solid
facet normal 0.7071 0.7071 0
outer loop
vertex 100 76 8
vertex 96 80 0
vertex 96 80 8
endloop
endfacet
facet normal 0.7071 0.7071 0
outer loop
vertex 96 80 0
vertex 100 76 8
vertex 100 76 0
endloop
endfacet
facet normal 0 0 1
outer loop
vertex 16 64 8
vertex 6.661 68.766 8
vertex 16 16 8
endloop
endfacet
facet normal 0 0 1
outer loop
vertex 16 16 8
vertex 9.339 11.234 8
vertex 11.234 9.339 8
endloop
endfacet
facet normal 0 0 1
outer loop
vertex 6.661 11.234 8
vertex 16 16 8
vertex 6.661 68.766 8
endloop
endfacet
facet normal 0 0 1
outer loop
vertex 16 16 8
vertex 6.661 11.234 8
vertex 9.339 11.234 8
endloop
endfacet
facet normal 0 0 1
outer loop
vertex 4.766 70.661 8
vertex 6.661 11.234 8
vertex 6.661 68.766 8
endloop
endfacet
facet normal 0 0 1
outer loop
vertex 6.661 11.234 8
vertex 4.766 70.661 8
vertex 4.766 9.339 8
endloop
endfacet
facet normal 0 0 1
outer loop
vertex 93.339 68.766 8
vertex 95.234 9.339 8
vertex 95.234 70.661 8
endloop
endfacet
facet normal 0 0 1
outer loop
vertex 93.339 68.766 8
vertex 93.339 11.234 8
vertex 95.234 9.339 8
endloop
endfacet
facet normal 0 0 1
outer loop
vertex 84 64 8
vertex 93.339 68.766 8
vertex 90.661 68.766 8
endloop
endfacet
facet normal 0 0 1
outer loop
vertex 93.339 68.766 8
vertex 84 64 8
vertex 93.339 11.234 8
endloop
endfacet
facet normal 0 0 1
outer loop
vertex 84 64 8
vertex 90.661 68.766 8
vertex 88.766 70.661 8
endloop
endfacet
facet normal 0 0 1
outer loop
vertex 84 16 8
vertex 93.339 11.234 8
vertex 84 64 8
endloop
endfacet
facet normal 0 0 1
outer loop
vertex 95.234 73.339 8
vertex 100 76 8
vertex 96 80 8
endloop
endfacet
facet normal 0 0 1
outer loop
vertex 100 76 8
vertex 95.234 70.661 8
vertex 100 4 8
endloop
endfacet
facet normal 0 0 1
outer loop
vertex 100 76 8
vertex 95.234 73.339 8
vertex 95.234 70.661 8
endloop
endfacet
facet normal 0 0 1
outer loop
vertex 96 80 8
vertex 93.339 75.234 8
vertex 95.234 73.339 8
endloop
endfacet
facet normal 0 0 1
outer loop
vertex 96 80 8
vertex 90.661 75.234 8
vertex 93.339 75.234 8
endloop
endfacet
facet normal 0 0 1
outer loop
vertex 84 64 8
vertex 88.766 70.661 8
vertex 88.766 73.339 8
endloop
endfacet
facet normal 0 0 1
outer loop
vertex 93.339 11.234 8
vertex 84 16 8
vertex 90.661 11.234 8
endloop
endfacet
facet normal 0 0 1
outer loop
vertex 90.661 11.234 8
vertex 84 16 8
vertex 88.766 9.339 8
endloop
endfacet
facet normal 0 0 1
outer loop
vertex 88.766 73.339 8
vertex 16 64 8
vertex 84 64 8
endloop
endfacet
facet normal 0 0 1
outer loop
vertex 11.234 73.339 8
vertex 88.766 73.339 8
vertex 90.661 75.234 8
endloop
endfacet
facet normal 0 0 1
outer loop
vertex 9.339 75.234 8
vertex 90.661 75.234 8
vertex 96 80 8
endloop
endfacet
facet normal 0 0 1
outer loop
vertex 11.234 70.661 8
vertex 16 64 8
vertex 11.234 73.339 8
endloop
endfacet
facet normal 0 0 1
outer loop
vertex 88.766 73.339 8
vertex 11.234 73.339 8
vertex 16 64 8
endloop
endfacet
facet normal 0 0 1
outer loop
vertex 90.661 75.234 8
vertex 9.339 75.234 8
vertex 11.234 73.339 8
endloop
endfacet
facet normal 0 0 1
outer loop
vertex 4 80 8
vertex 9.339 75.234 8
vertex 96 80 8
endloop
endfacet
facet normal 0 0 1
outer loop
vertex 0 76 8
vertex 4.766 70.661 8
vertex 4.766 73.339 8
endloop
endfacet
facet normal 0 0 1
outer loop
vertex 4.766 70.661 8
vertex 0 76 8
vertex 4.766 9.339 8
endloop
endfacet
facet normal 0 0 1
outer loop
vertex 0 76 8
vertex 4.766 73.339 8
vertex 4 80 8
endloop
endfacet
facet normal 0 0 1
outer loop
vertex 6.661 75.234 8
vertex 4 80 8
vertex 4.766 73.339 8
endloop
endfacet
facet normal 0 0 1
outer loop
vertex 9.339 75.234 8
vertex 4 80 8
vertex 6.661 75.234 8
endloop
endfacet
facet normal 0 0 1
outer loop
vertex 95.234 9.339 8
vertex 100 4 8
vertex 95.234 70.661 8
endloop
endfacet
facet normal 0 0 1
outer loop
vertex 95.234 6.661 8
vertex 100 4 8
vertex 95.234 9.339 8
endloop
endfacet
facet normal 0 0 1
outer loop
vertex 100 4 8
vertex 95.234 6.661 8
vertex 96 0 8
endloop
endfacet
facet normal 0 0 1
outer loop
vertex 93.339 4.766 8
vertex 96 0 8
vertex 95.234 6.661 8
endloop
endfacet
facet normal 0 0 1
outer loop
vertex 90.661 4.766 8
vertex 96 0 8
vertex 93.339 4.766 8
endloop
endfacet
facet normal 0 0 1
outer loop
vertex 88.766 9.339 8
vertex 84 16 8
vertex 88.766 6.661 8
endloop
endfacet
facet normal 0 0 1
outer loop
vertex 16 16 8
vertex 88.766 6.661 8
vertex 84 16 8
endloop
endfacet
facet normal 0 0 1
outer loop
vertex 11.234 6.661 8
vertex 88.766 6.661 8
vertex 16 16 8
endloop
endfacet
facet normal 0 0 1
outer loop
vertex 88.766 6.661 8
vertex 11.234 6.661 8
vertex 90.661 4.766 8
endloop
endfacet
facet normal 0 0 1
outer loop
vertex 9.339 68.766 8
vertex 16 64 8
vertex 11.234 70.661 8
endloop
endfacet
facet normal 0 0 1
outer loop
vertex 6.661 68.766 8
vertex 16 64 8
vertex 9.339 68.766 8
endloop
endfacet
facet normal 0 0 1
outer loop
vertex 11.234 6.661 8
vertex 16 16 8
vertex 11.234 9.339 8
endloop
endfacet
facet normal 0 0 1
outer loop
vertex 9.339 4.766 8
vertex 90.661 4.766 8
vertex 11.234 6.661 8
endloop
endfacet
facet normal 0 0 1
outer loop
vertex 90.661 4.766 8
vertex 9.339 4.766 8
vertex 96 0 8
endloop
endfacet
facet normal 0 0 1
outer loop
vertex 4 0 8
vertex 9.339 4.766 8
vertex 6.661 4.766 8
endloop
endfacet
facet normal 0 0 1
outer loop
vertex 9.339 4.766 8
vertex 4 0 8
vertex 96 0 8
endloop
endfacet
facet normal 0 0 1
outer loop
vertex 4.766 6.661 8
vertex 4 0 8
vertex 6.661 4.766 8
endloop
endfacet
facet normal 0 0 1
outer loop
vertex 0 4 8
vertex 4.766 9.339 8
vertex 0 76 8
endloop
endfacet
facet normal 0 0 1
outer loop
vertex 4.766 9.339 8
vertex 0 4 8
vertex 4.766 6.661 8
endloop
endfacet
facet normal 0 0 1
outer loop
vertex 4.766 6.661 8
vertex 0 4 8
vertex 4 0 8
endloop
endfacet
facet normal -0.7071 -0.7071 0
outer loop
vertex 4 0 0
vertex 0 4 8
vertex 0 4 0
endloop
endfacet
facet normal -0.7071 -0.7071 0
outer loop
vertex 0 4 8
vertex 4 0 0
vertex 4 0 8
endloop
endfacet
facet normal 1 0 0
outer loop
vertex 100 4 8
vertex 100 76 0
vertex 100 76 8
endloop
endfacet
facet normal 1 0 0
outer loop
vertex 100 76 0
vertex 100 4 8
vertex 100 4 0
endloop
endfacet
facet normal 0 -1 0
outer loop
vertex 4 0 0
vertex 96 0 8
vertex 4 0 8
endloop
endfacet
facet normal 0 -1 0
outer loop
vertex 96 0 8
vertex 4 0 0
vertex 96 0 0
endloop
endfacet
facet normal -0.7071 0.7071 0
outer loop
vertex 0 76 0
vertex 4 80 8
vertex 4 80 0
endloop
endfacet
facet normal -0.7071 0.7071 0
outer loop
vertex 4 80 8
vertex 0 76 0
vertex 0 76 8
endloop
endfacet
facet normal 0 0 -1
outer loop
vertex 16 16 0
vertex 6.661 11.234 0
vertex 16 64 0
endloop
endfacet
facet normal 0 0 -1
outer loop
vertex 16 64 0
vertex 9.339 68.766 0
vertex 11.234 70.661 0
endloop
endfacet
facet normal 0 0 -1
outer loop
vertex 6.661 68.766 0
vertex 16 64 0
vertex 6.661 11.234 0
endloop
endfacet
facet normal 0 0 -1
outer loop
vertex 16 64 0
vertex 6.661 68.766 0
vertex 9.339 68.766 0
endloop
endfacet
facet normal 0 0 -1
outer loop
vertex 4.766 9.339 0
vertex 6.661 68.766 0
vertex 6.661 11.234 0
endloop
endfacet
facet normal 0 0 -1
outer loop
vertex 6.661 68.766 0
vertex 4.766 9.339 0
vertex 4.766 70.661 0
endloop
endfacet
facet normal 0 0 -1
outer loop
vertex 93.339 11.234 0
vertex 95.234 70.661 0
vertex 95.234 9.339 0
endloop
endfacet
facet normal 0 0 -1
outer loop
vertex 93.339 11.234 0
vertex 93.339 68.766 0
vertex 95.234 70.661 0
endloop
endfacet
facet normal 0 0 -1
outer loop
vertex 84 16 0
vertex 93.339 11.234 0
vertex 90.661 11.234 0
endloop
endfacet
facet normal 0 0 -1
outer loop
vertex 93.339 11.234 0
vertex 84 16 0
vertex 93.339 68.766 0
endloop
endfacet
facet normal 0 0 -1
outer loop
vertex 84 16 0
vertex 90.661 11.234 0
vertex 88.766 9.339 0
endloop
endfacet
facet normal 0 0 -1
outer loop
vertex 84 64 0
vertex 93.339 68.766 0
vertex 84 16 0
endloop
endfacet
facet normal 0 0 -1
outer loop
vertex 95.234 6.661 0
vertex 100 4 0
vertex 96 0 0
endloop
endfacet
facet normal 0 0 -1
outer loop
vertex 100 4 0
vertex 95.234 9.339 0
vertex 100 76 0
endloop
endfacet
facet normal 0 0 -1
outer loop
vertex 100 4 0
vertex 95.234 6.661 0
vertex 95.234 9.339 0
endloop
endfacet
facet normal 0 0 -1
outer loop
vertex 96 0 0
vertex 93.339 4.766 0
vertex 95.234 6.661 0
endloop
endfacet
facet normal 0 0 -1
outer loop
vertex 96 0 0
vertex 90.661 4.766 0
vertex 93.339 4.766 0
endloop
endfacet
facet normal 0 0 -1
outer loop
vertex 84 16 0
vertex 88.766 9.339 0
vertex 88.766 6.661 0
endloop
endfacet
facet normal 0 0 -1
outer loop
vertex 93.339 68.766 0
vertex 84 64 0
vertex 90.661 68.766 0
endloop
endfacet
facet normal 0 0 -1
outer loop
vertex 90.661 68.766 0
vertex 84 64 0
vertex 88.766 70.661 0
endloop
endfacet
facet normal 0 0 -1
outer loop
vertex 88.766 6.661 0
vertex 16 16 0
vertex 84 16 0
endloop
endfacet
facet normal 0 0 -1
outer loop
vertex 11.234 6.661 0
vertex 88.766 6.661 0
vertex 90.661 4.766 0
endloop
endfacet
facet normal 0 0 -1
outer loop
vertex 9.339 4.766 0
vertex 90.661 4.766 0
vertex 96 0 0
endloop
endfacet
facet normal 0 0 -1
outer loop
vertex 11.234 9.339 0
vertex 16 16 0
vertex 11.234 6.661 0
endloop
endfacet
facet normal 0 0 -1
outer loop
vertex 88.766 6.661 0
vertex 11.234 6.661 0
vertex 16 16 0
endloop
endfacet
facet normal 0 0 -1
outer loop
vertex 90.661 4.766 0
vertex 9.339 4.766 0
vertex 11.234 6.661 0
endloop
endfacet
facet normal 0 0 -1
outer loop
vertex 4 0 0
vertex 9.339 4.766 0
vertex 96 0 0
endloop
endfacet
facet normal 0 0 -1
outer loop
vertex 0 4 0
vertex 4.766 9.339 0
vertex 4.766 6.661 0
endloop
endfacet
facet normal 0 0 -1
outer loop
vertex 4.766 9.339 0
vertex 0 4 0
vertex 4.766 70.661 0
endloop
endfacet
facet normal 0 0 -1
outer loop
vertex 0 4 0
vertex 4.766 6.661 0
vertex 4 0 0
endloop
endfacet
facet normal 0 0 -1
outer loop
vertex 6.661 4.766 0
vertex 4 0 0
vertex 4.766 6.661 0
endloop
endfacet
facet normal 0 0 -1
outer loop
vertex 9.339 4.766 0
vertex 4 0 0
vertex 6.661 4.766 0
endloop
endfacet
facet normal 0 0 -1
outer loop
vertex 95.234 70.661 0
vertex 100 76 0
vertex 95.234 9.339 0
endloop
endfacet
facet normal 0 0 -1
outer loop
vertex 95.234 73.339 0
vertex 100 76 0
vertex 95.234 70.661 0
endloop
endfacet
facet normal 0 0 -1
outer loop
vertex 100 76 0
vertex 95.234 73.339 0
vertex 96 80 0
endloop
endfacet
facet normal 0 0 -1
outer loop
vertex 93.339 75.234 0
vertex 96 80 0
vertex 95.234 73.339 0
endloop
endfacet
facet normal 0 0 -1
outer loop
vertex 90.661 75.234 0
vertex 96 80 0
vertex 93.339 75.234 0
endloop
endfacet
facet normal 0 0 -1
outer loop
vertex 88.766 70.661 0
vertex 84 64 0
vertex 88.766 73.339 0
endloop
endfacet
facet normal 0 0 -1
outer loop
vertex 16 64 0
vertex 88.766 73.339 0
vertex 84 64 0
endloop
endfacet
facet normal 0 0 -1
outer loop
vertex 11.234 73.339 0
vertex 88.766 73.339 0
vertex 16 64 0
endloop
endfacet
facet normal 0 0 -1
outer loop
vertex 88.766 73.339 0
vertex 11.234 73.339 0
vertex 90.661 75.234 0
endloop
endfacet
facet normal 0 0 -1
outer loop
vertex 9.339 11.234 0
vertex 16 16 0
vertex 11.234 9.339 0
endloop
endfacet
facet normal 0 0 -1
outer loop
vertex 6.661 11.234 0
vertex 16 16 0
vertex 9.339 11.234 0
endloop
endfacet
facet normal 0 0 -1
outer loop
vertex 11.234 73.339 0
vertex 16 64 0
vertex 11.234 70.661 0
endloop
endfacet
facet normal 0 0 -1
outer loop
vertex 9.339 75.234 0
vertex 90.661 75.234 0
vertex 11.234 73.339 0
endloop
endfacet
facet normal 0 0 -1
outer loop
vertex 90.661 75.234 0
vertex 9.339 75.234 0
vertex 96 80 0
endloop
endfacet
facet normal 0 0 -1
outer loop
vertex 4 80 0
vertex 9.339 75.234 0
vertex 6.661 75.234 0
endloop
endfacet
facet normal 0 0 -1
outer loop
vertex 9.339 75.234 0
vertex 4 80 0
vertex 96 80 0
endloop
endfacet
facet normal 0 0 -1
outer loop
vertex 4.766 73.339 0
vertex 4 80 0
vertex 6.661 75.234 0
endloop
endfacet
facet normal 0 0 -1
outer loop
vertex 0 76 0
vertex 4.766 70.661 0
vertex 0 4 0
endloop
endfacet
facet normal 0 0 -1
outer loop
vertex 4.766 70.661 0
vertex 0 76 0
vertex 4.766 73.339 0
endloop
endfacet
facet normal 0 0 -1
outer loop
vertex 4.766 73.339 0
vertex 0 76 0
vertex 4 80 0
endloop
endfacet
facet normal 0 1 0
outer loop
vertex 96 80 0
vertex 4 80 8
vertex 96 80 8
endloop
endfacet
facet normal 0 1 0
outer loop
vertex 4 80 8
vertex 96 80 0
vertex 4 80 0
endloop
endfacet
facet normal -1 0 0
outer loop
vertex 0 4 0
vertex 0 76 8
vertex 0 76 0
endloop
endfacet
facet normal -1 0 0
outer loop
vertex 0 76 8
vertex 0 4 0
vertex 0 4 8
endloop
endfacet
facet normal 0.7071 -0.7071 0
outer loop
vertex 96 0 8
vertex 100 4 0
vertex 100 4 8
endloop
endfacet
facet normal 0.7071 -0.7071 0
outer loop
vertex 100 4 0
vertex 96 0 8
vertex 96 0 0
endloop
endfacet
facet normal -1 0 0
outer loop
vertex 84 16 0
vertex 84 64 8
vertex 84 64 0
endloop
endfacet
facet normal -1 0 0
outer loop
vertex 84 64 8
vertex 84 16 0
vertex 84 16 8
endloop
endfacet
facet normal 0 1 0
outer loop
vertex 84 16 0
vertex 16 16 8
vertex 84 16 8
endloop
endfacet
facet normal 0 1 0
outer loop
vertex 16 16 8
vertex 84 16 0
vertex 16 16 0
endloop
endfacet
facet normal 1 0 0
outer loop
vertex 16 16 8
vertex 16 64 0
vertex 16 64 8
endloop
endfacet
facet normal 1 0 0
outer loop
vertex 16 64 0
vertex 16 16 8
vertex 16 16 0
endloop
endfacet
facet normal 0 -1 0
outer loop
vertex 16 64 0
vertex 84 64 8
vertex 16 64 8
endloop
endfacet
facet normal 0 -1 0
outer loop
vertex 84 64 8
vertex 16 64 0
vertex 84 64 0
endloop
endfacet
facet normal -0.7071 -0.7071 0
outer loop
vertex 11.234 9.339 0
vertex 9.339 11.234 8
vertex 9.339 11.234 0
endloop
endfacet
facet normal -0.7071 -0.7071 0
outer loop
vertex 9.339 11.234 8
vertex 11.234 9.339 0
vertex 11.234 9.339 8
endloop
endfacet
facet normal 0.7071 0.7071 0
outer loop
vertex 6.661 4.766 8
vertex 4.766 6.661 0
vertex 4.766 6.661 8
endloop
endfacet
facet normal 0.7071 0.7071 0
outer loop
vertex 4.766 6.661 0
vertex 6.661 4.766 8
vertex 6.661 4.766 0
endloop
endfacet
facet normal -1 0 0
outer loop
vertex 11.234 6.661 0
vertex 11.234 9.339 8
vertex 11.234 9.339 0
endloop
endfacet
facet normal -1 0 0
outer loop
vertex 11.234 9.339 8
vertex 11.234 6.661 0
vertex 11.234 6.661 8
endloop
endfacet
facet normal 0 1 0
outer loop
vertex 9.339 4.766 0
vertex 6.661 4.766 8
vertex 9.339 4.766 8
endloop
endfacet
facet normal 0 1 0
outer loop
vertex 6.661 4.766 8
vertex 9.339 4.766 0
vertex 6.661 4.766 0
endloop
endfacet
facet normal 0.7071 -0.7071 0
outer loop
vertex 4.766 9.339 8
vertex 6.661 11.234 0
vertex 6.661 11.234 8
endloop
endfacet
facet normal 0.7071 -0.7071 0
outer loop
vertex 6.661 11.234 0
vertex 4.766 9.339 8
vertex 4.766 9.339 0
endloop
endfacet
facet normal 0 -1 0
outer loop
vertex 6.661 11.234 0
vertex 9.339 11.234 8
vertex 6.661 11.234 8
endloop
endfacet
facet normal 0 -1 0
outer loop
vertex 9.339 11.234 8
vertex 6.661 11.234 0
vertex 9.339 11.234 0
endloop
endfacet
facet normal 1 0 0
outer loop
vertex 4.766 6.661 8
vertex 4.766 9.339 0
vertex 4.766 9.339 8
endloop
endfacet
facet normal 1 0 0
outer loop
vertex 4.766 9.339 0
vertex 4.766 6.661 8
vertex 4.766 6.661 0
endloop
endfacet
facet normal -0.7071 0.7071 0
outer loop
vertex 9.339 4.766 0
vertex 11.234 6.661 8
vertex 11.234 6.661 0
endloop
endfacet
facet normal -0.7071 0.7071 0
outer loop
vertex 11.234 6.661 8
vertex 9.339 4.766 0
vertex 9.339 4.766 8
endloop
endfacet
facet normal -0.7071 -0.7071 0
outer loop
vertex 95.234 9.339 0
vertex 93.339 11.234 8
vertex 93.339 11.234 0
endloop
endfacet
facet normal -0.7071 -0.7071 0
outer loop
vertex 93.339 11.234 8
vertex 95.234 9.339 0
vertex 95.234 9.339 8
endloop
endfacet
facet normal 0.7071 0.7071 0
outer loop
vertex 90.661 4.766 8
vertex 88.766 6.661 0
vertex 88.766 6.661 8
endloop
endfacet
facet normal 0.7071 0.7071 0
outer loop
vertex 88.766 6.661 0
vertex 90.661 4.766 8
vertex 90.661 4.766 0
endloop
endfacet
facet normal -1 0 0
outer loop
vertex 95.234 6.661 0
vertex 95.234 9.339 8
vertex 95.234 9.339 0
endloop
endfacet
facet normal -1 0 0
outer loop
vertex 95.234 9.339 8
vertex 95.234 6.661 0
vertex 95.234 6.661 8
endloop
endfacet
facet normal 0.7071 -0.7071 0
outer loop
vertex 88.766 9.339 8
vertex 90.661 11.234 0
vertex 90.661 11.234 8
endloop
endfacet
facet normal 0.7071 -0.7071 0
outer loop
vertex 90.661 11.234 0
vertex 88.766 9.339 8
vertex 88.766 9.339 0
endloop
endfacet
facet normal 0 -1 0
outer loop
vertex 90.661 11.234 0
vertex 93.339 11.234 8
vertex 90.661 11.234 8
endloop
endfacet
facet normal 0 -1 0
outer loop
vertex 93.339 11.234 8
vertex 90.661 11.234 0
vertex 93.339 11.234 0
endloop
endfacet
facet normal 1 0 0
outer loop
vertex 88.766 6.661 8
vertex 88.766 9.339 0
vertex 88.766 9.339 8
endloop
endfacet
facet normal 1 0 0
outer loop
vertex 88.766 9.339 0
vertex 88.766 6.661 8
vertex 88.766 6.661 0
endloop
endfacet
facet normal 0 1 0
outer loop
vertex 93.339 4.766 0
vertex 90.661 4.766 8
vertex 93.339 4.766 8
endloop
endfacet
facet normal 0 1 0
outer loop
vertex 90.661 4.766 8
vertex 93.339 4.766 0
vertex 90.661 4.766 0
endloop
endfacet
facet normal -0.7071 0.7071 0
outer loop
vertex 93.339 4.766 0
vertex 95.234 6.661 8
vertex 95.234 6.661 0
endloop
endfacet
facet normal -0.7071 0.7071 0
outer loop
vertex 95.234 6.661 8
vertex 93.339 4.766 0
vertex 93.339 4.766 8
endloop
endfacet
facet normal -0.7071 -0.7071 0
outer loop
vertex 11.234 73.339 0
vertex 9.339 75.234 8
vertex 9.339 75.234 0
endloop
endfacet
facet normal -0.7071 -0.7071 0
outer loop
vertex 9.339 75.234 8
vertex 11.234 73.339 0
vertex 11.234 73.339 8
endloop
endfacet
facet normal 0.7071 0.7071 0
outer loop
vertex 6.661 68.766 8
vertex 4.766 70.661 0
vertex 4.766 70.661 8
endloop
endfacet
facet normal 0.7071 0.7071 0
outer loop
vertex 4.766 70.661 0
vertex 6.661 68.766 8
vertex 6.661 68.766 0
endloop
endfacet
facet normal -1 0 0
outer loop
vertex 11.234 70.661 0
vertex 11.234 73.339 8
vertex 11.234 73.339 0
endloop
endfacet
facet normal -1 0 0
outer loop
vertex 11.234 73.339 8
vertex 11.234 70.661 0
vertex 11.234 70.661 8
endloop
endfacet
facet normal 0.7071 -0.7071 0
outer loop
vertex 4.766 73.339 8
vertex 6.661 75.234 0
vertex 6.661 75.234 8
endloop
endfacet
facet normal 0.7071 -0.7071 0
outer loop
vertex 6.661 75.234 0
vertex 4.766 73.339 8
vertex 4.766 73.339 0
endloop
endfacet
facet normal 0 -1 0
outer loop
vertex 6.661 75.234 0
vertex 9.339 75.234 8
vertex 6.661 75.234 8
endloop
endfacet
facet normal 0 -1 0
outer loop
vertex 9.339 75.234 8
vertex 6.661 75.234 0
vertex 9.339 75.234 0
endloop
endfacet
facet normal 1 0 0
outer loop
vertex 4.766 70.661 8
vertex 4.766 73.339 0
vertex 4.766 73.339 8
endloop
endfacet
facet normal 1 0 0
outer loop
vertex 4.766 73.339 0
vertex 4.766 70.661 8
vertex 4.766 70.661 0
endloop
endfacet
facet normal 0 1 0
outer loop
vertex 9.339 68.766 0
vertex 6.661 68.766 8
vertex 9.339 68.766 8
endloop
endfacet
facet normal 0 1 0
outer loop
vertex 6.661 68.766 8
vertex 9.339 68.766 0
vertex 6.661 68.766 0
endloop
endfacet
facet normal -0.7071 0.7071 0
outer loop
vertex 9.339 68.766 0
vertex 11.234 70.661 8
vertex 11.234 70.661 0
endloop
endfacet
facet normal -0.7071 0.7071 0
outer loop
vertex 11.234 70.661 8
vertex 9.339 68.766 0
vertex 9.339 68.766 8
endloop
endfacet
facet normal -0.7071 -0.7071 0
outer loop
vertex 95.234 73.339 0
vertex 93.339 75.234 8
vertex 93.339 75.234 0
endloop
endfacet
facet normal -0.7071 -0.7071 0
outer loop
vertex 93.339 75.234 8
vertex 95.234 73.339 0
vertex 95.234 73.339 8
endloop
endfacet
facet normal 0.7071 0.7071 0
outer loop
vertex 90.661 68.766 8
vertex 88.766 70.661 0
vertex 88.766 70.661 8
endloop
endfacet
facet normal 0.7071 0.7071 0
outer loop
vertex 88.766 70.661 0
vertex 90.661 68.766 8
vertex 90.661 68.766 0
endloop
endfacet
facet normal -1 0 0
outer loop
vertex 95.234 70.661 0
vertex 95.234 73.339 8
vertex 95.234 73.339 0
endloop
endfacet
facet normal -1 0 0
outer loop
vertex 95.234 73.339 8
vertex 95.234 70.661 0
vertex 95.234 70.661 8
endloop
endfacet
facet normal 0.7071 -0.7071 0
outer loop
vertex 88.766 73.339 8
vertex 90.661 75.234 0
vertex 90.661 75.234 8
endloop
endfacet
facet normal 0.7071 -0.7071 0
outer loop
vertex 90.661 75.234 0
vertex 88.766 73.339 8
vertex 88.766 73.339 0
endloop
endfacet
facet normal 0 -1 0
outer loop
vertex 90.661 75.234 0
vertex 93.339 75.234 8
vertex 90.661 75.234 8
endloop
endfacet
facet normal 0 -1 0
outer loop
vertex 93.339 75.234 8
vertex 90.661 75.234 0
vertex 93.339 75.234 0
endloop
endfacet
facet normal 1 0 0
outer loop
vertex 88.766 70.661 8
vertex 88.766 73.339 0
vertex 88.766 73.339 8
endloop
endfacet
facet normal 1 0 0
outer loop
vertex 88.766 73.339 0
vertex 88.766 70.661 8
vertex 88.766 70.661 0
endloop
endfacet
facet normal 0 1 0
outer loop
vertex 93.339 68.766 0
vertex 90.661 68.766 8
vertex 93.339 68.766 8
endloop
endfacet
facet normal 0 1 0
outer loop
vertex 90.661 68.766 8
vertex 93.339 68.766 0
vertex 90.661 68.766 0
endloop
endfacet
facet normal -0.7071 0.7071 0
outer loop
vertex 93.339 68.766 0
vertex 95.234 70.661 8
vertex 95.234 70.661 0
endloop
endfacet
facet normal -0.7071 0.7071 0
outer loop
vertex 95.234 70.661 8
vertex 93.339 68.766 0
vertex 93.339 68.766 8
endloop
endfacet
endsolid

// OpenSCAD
$fn = 32;

// ----------------------------------------------------------------------
// Frame plate: 100 x 80 frame, 16 mm rails
// ----------------------------------------------------------------------

// --- parameters (mm) ---
plate_l = 100;            // plate length, X
plate_w = 80;             // plate width, Y
plate_t = 8;              // plate thickness, Z (extrusion height)
corner_c = 4;             // corner chamfer
frame_bar = 16;           // frame rail width
bolt_r = 3.5;             // corner bolt window radius
bolt_inset = 8;           // bolt centre inset from the edges
fit_tol = 0.1;            // declared fit tolerance (prompt contract)
free_tol = 0.5;           // declared free tolerance (prompt contract)

win_l = plate_l - 2 * frame_bar;  // window length
win_w = plate_w - 2 * frame_bar;  // window width
bolt_d = 2 * bolt_r;  // corner hole diameter

profile = [[4, 0], [96, 0], [100, 4], [100, 76], [96, 80], [4, 80], [0, 76], [0, 4]];  // primary outline, 8 points, counter clockwise
void_1 = [[16, 16], [84, 16], [84, 64], [16, 64]];  // the window, 4 points
void_2 = [[11.234, 9.339], [9.339, 11.234], [6.661, 11.234], [4.766, 9.339], [4.766, 6.661], [6.661, 4.766], [9.339, 4.766], [11.234, 6.661]];  // corner bolt window, 8 points
void_3 = [[95.234, 9.339], [93.339, 11.234], [90.661, 11.234], [88.766, 9.339], [88.766, 6.661], [90.661, 4.766], [93.339, 4.766], [95.234, 6.661]];  // corner bolt window, 8 points
void_4 = [[11.234, 73.339], [9.339, 75.234], [6.661, 75.234], [4.766, 73.339], [4.766, 70.661], [6.661, 68.766], [9.339, 68.766], [11.234, 70.661]];  // corner bolt window, 8 points
void_5 = [[95.234, 73.339], [93.339, 75.234], [90.661, 75.234], [88.766, 73.339], [88.766, 70.661], [90.661, 68.766], [93.339, 68.766], [95.234, 70.661]];  // corner bolt window, 8 points

// --- the one profile operation ---
difference() {
  linear_extrude(height = plate_t) polygon(points = profile);
  translate([0, 0, -1])
    linear_extrude(height = plate_t + 2) polygon(points = void_1);
  translate([0, 0, -1])
    linear_extrude(height = plate_t + 2) polygon(points = void_2);
  translate([0, 0, -1])
    linear_extrude(height = plate_t + 2) polygon(points = void_3);
  translate([0, 0, -1])
    linear_extrude(height = plate_t + 2) polygon(points = void_4);
  translate([0, 0, -1])
    linear_extrude(height = plate_t + 2) polygon(points = void_5);
}
